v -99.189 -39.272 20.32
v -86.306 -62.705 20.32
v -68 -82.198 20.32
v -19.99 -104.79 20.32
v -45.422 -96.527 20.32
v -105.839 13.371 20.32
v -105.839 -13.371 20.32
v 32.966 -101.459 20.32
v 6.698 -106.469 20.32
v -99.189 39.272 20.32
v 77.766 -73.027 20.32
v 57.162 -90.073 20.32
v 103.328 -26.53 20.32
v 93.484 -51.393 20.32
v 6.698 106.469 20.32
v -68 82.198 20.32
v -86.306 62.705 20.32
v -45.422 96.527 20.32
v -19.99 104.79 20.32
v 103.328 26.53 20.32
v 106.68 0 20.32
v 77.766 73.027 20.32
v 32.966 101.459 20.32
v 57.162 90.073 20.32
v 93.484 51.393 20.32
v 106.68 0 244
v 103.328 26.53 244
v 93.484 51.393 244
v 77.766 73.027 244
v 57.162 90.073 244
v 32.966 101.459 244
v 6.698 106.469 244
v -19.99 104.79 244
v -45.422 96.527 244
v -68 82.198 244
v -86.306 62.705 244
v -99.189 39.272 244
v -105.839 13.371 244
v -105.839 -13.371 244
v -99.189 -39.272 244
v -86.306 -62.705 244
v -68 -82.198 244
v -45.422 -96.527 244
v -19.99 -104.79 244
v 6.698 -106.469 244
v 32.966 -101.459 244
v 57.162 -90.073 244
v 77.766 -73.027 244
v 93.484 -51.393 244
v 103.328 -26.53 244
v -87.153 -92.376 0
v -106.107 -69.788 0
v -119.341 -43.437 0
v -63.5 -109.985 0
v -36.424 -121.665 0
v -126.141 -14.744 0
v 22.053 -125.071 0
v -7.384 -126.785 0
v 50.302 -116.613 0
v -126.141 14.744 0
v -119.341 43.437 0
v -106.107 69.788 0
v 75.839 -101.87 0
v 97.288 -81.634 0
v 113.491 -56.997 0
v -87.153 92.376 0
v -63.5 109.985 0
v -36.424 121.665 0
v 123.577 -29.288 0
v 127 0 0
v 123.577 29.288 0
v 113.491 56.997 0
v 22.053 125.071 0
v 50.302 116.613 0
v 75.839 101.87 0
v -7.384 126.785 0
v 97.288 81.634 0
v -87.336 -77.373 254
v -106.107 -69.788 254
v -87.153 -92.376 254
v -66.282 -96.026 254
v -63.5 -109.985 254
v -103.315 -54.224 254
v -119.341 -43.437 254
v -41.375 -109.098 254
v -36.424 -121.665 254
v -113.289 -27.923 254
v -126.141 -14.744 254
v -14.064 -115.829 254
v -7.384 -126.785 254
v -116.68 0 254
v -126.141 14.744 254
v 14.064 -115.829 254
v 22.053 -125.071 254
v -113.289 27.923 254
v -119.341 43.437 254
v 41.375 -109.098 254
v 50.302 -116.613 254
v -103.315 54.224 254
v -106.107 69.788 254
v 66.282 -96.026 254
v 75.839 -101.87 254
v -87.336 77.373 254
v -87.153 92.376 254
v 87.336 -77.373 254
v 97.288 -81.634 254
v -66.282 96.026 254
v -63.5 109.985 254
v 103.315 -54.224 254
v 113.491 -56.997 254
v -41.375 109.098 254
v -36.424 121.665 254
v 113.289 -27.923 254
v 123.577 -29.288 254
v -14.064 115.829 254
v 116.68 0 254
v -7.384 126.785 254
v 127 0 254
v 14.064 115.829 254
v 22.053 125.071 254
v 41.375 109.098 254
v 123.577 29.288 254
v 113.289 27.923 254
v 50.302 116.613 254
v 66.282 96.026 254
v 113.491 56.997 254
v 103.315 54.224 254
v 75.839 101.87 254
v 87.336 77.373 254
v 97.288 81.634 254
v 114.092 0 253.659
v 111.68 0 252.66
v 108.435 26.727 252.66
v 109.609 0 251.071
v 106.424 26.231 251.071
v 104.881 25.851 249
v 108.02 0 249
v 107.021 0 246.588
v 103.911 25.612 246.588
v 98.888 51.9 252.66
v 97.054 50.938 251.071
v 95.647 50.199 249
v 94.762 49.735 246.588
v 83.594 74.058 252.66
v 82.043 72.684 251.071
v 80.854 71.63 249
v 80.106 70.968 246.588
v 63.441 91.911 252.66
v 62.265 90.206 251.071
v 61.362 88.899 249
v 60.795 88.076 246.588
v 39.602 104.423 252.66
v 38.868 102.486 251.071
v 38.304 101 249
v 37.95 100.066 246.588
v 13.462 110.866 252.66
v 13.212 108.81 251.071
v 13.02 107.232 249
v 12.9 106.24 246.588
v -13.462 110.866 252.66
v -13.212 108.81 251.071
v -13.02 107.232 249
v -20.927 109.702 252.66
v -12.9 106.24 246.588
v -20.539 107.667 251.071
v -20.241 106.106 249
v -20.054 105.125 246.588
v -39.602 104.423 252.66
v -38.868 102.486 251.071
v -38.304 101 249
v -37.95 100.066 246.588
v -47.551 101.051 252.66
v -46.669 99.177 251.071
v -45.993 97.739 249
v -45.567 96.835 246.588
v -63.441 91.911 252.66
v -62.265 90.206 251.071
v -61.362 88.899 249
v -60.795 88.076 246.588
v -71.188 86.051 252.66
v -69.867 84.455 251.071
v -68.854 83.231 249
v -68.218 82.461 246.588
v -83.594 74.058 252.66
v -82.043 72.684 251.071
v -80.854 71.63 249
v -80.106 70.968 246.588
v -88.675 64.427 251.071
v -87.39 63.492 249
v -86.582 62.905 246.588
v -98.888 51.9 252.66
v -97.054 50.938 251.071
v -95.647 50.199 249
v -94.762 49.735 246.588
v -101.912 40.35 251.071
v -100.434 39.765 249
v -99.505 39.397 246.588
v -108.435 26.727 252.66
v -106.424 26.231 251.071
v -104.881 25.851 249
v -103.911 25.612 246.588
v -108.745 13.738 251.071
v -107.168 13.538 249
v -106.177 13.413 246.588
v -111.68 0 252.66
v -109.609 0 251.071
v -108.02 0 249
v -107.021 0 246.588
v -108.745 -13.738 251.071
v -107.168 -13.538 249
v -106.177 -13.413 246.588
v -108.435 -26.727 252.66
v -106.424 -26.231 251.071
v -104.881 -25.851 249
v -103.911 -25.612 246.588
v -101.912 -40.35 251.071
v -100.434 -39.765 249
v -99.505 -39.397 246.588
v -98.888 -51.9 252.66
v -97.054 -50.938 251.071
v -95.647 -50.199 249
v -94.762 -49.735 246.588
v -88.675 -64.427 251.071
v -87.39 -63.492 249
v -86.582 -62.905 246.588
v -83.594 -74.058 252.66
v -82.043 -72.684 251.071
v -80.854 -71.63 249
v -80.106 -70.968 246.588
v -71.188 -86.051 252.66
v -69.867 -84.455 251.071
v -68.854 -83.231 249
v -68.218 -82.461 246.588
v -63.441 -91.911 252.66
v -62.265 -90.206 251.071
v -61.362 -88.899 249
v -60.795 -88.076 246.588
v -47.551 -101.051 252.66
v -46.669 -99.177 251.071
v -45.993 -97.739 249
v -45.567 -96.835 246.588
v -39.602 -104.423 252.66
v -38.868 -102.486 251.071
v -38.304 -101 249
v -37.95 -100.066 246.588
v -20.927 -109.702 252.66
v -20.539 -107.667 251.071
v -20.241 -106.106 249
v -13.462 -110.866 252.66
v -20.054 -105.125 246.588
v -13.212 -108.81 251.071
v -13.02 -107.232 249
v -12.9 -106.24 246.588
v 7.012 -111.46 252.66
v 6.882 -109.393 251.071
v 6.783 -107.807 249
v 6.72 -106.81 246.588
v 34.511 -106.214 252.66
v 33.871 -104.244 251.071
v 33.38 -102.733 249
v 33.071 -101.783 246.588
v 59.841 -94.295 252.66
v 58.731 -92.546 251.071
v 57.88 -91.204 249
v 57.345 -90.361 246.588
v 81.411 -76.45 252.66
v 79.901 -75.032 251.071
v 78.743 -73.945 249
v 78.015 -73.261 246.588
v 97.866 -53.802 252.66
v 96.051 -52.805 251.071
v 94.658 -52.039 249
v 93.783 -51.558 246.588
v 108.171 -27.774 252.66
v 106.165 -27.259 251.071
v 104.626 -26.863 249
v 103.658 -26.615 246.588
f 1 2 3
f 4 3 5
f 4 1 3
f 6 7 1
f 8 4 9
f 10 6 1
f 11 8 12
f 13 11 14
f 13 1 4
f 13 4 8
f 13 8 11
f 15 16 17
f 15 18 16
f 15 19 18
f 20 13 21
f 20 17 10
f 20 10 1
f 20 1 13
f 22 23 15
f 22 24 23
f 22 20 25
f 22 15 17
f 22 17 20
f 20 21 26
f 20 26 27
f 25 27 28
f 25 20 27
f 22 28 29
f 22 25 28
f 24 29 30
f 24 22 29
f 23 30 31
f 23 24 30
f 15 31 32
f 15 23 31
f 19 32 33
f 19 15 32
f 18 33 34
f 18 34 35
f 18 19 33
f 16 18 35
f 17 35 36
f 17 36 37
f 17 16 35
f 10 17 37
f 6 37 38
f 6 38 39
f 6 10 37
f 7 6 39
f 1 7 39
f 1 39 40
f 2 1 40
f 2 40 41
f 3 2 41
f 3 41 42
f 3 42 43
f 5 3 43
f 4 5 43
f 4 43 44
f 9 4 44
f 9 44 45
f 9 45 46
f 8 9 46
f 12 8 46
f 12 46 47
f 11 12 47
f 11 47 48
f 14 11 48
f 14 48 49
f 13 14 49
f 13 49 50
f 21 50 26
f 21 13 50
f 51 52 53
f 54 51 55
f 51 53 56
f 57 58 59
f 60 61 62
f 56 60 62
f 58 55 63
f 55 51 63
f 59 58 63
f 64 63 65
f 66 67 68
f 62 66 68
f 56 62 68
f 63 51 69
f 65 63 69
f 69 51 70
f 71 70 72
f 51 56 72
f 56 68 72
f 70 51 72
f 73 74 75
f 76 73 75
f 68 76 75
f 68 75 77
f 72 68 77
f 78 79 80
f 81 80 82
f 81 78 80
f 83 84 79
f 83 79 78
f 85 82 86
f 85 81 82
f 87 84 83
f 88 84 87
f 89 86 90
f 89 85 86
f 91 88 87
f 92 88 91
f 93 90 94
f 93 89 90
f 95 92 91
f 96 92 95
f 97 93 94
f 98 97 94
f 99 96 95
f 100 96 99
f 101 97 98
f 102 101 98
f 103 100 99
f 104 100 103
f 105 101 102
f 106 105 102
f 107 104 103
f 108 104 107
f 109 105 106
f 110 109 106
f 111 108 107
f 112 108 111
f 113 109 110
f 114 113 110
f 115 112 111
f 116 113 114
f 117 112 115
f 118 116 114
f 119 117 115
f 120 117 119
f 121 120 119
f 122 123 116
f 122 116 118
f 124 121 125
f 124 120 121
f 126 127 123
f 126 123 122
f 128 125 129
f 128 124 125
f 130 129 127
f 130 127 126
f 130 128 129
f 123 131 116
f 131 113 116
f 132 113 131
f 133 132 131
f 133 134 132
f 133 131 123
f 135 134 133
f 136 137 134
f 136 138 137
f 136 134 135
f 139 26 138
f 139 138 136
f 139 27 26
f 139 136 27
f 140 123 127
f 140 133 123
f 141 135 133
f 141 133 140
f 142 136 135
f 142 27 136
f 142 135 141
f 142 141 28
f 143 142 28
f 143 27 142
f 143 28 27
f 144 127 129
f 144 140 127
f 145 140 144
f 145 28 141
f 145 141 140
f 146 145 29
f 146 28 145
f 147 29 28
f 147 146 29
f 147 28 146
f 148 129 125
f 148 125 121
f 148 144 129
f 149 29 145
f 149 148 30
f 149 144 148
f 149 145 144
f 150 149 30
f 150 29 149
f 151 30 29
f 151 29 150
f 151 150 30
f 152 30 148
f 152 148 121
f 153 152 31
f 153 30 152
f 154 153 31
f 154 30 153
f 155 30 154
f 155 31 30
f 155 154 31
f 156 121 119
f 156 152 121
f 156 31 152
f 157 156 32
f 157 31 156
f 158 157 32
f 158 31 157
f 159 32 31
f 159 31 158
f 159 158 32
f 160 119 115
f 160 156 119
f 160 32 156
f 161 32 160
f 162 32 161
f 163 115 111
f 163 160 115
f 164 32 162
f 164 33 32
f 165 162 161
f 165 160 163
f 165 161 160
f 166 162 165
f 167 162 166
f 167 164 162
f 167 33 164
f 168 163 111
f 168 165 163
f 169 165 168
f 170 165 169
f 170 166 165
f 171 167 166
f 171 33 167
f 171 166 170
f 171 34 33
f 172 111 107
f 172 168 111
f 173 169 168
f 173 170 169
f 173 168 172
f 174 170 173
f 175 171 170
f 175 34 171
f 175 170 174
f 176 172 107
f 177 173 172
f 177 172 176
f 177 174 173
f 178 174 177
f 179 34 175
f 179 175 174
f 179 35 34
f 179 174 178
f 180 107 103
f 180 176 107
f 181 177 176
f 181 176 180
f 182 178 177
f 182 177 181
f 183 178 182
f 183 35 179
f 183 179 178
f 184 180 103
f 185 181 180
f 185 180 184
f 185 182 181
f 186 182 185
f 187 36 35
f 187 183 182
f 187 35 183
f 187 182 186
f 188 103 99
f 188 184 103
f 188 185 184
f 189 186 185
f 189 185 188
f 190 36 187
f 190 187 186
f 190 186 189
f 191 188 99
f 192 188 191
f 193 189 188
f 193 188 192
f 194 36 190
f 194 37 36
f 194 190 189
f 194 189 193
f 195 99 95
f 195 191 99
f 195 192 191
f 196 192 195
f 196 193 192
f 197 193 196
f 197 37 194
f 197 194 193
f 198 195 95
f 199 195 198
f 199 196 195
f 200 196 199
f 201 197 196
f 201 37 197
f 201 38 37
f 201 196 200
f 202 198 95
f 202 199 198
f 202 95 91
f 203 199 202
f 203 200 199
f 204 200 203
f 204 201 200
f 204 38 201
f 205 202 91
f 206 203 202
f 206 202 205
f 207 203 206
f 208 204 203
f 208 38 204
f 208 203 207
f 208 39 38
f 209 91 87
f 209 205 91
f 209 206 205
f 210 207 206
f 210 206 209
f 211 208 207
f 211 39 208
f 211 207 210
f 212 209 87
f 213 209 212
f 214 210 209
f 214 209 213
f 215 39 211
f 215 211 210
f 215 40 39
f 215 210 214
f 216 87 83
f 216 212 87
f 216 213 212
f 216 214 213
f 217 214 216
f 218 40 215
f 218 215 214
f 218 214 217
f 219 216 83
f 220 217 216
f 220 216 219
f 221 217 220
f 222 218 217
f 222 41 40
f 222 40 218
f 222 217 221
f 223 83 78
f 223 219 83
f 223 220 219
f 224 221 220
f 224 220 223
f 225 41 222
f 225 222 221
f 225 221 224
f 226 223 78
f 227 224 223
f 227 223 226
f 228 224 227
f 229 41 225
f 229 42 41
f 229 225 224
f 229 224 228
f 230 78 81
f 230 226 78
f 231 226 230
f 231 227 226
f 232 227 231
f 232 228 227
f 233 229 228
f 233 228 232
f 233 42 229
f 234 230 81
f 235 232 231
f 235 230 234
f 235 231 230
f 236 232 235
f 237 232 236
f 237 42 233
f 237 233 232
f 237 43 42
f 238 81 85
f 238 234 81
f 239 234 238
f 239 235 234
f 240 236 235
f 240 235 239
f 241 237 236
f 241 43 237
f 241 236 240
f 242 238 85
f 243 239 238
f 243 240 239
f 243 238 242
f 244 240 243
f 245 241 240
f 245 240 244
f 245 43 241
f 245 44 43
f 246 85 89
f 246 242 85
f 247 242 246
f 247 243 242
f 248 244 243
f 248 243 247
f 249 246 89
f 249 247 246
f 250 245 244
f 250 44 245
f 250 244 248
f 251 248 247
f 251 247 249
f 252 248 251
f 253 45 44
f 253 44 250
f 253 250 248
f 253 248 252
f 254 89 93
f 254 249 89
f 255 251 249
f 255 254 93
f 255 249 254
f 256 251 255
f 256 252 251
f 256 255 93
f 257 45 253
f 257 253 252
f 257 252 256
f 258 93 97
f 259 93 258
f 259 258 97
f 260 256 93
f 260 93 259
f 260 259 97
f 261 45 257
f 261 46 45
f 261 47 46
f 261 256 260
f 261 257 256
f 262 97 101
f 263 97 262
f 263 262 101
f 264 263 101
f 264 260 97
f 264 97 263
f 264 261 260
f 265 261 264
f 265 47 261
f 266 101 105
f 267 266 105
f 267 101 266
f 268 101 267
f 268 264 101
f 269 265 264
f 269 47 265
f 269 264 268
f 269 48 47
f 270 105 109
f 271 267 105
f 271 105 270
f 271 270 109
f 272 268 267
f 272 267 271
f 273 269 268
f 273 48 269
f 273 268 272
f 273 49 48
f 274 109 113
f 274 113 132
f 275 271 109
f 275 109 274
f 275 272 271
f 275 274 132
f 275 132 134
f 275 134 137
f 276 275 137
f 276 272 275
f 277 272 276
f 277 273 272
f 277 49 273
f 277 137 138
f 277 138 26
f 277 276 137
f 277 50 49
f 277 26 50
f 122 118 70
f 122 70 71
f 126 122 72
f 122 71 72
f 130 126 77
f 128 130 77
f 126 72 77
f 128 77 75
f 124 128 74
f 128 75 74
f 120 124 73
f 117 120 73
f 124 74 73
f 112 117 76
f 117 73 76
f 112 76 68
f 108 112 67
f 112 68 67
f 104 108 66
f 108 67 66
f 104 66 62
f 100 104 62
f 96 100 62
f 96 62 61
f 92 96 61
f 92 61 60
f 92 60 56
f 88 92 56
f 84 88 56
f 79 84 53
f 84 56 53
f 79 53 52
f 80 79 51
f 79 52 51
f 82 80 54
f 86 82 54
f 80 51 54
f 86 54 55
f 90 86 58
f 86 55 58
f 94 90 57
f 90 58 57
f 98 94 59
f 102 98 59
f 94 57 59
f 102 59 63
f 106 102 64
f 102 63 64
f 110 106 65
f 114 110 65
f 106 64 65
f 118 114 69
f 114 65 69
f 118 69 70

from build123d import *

# Parameters (mm, degrees)
F3_R     = 127
F0_DEPTH = 254
F1_T     = -20.32
F2_R     = 10


with BuildPart() as f0:
    # F3 (on Top) → F0 (new body)
    with BuildSketch(Plane.XY):
        Circle(F3_R)
    extrude(amount=F0_DEPTH)

    # F1
    f1_openings = [f0.faces().sort_by_distance(p)[0] for p in [
        (0, 0, 254),
    ]]
    offset(amount=F1_T, openings=f1_openings)

    # F2
    f2_edges = [f0.edges().sort_by_distance(p)[0] for p in [
        (-106.68, 0, 254),
    ]]
    fillet(f2_edges, radius=F2_R)


solid = f0.part
